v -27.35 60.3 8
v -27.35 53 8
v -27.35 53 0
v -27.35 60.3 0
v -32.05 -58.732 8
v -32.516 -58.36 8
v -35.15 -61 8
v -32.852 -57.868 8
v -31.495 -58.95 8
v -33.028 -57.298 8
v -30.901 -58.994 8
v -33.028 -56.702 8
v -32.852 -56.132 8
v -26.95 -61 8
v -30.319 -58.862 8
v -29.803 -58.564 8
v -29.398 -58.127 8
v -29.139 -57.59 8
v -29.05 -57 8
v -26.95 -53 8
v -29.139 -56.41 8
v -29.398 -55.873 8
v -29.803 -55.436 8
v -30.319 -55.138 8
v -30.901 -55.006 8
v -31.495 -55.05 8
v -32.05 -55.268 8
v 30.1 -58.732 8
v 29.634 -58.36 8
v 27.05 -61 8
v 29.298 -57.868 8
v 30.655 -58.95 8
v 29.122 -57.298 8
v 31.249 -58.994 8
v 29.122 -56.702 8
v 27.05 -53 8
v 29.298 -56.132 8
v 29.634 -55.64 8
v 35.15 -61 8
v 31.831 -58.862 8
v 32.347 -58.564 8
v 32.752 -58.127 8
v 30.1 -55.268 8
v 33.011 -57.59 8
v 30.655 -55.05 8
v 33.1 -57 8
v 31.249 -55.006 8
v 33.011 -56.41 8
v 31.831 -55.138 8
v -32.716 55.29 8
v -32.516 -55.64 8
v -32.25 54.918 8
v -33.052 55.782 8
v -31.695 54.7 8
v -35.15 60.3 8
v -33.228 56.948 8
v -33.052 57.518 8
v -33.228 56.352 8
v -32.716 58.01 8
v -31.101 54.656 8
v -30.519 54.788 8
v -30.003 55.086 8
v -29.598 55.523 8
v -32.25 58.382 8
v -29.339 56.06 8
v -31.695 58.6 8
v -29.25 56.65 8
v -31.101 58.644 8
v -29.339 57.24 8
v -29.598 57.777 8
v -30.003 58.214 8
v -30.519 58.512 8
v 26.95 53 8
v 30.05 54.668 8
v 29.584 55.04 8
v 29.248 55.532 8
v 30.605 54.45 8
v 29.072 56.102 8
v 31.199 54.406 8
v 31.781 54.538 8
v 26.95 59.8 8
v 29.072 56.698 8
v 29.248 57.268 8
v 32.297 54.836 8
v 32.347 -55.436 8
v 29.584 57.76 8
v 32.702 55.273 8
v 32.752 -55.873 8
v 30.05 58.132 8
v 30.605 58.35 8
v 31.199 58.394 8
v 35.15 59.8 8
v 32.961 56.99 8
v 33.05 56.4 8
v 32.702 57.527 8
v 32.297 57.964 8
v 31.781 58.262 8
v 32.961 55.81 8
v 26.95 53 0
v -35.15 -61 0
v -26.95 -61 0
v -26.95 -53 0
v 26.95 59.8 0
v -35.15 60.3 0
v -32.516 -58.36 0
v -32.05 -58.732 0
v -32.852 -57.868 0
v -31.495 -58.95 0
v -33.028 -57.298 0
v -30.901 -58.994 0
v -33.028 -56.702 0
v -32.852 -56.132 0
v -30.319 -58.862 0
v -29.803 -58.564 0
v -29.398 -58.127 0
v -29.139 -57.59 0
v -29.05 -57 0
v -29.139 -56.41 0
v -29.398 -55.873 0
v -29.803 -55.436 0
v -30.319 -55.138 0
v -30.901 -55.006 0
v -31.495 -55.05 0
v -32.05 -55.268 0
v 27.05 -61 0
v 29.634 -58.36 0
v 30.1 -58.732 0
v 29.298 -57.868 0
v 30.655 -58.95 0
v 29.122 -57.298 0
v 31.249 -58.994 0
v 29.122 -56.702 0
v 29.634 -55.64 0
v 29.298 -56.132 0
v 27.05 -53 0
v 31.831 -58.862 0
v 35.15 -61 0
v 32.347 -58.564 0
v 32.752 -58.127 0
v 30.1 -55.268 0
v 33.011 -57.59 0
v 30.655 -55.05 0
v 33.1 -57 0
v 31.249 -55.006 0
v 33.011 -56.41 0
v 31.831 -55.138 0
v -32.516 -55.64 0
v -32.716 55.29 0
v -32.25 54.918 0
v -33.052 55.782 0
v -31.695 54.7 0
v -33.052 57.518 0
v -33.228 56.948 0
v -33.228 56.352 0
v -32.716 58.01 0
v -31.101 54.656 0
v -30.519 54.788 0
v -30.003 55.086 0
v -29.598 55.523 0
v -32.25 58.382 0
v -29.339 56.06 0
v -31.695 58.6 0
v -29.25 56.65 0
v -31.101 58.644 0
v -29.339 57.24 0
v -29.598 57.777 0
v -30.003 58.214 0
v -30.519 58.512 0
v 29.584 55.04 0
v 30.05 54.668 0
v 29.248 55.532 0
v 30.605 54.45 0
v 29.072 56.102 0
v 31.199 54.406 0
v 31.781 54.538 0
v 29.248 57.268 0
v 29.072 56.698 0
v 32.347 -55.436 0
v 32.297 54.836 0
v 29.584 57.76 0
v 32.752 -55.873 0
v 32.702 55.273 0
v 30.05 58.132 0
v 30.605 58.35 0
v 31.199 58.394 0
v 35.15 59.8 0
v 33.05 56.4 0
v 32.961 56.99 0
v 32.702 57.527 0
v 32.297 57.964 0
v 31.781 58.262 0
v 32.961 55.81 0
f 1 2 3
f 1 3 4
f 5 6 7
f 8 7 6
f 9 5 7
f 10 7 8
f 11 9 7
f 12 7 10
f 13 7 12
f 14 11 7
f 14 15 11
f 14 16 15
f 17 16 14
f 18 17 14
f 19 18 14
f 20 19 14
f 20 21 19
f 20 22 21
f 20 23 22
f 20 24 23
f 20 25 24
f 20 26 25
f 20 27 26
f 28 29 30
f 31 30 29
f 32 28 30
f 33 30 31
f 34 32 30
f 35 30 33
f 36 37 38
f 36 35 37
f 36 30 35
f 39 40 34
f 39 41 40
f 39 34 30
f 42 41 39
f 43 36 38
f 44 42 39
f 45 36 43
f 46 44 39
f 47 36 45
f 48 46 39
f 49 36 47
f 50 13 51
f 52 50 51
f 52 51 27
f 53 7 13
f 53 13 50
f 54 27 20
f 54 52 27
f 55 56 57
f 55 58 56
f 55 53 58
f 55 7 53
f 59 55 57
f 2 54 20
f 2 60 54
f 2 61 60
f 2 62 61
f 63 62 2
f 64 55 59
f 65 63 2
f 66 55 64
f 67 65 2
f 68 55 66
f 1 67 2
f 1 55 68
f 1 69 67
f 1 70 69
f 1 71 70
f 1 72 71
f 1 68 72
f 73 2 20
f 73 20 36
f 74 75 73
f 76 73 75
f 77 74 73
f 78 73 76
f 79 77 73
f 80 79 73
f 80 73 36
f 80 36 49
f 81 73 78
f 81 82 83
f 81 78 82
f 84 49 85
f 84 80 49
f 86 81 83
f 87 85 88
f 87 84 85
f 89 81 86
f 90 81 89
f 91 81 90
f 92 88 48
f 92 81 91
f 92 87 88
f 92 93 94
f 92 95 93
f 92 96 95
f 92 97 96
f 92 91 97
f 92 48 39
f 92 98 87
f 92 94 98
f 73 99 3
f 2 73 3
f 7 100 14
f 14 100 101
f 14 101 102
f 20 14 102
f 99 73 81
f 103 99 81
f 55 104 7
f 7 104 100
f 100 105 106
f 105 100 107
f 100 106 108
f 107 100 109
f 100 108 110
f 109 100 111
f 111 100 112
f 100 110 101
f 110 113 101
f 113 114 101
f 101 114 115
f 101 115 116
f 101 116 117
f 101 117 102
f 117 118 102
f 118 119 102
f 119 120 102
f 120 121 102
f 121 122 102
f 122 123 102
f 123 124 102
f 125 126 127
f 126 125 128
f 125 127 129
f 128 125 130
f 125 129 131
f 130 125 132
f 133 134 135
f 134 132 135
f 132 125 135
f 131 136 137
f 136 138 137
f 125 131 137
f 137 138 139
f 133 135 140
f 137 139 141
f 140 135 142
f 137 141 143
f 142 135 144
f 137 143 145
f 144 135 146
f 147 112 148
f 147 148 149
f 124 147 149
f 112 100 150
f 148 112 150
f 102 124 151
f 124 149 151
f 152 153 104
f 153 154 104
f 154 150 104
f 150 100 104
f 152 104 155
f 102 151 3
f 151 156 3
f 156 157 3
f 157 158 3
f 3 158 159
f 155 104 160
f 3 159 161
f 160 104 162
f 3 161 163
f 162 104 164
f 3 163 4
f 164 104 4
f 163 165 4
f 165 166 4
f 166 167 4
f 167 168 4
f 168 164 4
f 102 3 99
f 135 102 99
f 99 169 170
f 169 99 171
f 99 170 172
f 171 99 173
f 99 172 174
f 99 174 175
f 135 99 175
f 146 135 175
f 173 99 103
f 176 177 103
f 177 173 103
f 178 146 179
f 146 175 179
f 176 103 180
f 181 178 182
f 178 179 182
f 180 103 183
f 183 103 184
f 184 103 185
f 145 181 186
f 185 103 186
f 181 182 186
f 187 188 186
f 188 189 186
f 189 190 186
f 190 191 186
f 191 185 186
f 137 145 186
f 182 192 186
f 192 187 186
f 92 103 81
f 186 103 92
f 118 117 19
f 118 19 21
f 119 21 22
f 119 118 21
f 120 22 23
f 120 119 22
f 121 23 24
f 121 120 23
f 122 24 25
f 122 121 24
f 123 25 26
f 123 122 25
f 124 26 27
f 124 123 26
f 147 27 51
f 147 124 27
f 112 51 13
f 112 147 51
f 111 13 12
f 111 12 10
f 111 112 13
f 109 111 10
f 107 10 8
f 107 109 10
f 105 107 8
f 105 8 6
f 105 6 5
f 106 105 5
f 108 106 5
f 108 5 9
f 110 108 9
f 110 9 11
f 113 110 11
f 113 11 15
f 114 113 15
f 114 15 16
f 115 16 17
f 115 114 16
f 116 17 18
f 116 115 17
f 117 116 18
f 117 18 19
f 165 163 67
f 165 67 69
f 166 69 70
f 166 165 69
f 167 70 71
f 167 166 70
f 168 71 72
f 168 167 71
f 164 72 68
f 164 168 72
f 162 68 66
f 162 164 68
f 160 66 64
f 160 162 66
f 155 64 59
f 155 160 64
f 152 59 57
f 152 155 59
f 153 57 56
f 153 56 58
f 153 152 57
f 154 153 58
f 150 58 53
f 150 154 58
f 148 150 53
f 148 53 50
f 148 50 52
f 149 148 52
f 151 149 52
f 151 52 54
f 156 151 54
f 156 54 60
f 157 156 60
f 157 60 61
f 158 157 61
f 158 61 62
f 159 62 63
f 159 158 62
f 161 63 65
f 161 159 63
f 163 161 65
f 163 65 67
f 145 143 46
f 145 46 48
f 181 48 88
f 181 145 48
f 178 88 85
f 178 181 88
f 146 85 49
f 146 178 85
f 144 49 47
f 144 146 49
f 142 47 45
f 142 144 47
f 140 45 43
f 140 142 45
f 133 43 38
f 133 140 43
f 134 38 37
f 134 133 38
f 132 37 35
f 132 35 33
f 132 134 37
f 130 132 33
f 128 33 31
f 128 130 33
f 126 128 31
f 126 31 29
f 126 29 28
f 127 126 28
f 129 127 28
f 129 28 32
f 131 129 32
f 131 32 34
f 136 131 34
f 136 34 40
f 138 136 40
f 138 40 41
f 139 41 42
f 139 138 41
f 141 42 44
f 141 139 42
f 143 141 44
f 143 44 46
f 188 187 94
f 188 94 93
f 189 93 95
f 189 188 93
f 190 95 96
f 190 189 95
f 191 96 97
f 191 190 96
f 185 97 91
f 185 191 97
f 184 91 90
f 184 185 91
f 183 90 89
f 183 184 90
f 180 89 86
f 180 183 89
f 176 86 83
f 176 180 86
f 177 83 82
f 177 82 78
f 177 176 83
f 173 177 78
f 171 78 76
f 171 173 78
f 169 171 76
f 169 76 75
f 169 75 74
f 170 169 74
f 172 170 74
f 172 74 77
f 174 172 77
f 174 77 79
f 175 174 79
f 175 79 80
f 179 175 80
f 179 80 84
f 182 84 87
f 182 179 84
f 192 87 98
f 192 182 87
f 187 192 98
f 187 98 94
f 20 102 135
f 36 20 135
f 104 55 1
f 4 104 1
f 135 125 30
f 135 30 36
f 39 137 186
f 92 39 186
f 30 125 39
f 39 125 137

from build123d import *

# Parameters (mm, degrees)
SKETCH1_W           = 7.8
SKETCH1_H           = 7.3
SKETCH1_R           = 2
SKETCH1_W_2         = 8.2
SKETCH1_H_2         = 8
SKETCH1_H_3         = 6.8
SKETCH1_W_3         = 8.1
BOSS_EXTRUDE1_DEPTH = 8


with BuildPart() as part:
    # Sketch1 → Boss-Extrude1 (new body)
    # profile 1 of 5: a face of its own
    with BuildSketch(Plane.XY):
        with Locations((-31.25, 56.65)):
            Rectangle(SKETCH1_W, SKETCH1_H)
        with Locations((-31.25, 56.65)):
            Circle(SKETCH1_R, mode=Mode.SUBTRACT)
    # profile 2 of 5: a face of its own
    with BuildSketch(Plane.XY):
        Polygon((-27.35, 53), (-35.15, 53), (-35.15, -53), (-26.95, -53), (27.05, -53), (35.15, -53), (35.15, 53), (26.95, 53), align=None)
    # profile 3 of 5: a face of its own
    with BuildSketch(Plane.XY):
        with Locations((-31.05, -57)):
            Rectangle(SKETCH1_W_2, SKETCH1_H_2)
        with Locations((-31.05, -57)):
            Circle(SKETCH1_R, mode=Mode.SUBTRACT)
    # profile 4 of 5: a face of its own
    with BuildSketch(Plane.XY):
        with Locations((31.05, 56.4)):
            Rectangle(SKETCH1_W_2, SKETCH1_H_3)
        with Locations((31.05, 56.4)):
            Circle(SKETCH1_R, mode=Mode.SUBTRACT)
    # profile 5 of 5: a face of its own
    with BuildSketch(Plane.XY):
        with Locations((31.1, -57)):
            Rectangle(SKETCH1_W_3, SKETCH1_H_2)
        with Locations((31.1, -57)):
            Circle(SKETCH1_R, mode=Mode.SUBTRACT)
    extrude(amount=BOSS_EXTRUDE1_DEPTH)


solid = part.part
